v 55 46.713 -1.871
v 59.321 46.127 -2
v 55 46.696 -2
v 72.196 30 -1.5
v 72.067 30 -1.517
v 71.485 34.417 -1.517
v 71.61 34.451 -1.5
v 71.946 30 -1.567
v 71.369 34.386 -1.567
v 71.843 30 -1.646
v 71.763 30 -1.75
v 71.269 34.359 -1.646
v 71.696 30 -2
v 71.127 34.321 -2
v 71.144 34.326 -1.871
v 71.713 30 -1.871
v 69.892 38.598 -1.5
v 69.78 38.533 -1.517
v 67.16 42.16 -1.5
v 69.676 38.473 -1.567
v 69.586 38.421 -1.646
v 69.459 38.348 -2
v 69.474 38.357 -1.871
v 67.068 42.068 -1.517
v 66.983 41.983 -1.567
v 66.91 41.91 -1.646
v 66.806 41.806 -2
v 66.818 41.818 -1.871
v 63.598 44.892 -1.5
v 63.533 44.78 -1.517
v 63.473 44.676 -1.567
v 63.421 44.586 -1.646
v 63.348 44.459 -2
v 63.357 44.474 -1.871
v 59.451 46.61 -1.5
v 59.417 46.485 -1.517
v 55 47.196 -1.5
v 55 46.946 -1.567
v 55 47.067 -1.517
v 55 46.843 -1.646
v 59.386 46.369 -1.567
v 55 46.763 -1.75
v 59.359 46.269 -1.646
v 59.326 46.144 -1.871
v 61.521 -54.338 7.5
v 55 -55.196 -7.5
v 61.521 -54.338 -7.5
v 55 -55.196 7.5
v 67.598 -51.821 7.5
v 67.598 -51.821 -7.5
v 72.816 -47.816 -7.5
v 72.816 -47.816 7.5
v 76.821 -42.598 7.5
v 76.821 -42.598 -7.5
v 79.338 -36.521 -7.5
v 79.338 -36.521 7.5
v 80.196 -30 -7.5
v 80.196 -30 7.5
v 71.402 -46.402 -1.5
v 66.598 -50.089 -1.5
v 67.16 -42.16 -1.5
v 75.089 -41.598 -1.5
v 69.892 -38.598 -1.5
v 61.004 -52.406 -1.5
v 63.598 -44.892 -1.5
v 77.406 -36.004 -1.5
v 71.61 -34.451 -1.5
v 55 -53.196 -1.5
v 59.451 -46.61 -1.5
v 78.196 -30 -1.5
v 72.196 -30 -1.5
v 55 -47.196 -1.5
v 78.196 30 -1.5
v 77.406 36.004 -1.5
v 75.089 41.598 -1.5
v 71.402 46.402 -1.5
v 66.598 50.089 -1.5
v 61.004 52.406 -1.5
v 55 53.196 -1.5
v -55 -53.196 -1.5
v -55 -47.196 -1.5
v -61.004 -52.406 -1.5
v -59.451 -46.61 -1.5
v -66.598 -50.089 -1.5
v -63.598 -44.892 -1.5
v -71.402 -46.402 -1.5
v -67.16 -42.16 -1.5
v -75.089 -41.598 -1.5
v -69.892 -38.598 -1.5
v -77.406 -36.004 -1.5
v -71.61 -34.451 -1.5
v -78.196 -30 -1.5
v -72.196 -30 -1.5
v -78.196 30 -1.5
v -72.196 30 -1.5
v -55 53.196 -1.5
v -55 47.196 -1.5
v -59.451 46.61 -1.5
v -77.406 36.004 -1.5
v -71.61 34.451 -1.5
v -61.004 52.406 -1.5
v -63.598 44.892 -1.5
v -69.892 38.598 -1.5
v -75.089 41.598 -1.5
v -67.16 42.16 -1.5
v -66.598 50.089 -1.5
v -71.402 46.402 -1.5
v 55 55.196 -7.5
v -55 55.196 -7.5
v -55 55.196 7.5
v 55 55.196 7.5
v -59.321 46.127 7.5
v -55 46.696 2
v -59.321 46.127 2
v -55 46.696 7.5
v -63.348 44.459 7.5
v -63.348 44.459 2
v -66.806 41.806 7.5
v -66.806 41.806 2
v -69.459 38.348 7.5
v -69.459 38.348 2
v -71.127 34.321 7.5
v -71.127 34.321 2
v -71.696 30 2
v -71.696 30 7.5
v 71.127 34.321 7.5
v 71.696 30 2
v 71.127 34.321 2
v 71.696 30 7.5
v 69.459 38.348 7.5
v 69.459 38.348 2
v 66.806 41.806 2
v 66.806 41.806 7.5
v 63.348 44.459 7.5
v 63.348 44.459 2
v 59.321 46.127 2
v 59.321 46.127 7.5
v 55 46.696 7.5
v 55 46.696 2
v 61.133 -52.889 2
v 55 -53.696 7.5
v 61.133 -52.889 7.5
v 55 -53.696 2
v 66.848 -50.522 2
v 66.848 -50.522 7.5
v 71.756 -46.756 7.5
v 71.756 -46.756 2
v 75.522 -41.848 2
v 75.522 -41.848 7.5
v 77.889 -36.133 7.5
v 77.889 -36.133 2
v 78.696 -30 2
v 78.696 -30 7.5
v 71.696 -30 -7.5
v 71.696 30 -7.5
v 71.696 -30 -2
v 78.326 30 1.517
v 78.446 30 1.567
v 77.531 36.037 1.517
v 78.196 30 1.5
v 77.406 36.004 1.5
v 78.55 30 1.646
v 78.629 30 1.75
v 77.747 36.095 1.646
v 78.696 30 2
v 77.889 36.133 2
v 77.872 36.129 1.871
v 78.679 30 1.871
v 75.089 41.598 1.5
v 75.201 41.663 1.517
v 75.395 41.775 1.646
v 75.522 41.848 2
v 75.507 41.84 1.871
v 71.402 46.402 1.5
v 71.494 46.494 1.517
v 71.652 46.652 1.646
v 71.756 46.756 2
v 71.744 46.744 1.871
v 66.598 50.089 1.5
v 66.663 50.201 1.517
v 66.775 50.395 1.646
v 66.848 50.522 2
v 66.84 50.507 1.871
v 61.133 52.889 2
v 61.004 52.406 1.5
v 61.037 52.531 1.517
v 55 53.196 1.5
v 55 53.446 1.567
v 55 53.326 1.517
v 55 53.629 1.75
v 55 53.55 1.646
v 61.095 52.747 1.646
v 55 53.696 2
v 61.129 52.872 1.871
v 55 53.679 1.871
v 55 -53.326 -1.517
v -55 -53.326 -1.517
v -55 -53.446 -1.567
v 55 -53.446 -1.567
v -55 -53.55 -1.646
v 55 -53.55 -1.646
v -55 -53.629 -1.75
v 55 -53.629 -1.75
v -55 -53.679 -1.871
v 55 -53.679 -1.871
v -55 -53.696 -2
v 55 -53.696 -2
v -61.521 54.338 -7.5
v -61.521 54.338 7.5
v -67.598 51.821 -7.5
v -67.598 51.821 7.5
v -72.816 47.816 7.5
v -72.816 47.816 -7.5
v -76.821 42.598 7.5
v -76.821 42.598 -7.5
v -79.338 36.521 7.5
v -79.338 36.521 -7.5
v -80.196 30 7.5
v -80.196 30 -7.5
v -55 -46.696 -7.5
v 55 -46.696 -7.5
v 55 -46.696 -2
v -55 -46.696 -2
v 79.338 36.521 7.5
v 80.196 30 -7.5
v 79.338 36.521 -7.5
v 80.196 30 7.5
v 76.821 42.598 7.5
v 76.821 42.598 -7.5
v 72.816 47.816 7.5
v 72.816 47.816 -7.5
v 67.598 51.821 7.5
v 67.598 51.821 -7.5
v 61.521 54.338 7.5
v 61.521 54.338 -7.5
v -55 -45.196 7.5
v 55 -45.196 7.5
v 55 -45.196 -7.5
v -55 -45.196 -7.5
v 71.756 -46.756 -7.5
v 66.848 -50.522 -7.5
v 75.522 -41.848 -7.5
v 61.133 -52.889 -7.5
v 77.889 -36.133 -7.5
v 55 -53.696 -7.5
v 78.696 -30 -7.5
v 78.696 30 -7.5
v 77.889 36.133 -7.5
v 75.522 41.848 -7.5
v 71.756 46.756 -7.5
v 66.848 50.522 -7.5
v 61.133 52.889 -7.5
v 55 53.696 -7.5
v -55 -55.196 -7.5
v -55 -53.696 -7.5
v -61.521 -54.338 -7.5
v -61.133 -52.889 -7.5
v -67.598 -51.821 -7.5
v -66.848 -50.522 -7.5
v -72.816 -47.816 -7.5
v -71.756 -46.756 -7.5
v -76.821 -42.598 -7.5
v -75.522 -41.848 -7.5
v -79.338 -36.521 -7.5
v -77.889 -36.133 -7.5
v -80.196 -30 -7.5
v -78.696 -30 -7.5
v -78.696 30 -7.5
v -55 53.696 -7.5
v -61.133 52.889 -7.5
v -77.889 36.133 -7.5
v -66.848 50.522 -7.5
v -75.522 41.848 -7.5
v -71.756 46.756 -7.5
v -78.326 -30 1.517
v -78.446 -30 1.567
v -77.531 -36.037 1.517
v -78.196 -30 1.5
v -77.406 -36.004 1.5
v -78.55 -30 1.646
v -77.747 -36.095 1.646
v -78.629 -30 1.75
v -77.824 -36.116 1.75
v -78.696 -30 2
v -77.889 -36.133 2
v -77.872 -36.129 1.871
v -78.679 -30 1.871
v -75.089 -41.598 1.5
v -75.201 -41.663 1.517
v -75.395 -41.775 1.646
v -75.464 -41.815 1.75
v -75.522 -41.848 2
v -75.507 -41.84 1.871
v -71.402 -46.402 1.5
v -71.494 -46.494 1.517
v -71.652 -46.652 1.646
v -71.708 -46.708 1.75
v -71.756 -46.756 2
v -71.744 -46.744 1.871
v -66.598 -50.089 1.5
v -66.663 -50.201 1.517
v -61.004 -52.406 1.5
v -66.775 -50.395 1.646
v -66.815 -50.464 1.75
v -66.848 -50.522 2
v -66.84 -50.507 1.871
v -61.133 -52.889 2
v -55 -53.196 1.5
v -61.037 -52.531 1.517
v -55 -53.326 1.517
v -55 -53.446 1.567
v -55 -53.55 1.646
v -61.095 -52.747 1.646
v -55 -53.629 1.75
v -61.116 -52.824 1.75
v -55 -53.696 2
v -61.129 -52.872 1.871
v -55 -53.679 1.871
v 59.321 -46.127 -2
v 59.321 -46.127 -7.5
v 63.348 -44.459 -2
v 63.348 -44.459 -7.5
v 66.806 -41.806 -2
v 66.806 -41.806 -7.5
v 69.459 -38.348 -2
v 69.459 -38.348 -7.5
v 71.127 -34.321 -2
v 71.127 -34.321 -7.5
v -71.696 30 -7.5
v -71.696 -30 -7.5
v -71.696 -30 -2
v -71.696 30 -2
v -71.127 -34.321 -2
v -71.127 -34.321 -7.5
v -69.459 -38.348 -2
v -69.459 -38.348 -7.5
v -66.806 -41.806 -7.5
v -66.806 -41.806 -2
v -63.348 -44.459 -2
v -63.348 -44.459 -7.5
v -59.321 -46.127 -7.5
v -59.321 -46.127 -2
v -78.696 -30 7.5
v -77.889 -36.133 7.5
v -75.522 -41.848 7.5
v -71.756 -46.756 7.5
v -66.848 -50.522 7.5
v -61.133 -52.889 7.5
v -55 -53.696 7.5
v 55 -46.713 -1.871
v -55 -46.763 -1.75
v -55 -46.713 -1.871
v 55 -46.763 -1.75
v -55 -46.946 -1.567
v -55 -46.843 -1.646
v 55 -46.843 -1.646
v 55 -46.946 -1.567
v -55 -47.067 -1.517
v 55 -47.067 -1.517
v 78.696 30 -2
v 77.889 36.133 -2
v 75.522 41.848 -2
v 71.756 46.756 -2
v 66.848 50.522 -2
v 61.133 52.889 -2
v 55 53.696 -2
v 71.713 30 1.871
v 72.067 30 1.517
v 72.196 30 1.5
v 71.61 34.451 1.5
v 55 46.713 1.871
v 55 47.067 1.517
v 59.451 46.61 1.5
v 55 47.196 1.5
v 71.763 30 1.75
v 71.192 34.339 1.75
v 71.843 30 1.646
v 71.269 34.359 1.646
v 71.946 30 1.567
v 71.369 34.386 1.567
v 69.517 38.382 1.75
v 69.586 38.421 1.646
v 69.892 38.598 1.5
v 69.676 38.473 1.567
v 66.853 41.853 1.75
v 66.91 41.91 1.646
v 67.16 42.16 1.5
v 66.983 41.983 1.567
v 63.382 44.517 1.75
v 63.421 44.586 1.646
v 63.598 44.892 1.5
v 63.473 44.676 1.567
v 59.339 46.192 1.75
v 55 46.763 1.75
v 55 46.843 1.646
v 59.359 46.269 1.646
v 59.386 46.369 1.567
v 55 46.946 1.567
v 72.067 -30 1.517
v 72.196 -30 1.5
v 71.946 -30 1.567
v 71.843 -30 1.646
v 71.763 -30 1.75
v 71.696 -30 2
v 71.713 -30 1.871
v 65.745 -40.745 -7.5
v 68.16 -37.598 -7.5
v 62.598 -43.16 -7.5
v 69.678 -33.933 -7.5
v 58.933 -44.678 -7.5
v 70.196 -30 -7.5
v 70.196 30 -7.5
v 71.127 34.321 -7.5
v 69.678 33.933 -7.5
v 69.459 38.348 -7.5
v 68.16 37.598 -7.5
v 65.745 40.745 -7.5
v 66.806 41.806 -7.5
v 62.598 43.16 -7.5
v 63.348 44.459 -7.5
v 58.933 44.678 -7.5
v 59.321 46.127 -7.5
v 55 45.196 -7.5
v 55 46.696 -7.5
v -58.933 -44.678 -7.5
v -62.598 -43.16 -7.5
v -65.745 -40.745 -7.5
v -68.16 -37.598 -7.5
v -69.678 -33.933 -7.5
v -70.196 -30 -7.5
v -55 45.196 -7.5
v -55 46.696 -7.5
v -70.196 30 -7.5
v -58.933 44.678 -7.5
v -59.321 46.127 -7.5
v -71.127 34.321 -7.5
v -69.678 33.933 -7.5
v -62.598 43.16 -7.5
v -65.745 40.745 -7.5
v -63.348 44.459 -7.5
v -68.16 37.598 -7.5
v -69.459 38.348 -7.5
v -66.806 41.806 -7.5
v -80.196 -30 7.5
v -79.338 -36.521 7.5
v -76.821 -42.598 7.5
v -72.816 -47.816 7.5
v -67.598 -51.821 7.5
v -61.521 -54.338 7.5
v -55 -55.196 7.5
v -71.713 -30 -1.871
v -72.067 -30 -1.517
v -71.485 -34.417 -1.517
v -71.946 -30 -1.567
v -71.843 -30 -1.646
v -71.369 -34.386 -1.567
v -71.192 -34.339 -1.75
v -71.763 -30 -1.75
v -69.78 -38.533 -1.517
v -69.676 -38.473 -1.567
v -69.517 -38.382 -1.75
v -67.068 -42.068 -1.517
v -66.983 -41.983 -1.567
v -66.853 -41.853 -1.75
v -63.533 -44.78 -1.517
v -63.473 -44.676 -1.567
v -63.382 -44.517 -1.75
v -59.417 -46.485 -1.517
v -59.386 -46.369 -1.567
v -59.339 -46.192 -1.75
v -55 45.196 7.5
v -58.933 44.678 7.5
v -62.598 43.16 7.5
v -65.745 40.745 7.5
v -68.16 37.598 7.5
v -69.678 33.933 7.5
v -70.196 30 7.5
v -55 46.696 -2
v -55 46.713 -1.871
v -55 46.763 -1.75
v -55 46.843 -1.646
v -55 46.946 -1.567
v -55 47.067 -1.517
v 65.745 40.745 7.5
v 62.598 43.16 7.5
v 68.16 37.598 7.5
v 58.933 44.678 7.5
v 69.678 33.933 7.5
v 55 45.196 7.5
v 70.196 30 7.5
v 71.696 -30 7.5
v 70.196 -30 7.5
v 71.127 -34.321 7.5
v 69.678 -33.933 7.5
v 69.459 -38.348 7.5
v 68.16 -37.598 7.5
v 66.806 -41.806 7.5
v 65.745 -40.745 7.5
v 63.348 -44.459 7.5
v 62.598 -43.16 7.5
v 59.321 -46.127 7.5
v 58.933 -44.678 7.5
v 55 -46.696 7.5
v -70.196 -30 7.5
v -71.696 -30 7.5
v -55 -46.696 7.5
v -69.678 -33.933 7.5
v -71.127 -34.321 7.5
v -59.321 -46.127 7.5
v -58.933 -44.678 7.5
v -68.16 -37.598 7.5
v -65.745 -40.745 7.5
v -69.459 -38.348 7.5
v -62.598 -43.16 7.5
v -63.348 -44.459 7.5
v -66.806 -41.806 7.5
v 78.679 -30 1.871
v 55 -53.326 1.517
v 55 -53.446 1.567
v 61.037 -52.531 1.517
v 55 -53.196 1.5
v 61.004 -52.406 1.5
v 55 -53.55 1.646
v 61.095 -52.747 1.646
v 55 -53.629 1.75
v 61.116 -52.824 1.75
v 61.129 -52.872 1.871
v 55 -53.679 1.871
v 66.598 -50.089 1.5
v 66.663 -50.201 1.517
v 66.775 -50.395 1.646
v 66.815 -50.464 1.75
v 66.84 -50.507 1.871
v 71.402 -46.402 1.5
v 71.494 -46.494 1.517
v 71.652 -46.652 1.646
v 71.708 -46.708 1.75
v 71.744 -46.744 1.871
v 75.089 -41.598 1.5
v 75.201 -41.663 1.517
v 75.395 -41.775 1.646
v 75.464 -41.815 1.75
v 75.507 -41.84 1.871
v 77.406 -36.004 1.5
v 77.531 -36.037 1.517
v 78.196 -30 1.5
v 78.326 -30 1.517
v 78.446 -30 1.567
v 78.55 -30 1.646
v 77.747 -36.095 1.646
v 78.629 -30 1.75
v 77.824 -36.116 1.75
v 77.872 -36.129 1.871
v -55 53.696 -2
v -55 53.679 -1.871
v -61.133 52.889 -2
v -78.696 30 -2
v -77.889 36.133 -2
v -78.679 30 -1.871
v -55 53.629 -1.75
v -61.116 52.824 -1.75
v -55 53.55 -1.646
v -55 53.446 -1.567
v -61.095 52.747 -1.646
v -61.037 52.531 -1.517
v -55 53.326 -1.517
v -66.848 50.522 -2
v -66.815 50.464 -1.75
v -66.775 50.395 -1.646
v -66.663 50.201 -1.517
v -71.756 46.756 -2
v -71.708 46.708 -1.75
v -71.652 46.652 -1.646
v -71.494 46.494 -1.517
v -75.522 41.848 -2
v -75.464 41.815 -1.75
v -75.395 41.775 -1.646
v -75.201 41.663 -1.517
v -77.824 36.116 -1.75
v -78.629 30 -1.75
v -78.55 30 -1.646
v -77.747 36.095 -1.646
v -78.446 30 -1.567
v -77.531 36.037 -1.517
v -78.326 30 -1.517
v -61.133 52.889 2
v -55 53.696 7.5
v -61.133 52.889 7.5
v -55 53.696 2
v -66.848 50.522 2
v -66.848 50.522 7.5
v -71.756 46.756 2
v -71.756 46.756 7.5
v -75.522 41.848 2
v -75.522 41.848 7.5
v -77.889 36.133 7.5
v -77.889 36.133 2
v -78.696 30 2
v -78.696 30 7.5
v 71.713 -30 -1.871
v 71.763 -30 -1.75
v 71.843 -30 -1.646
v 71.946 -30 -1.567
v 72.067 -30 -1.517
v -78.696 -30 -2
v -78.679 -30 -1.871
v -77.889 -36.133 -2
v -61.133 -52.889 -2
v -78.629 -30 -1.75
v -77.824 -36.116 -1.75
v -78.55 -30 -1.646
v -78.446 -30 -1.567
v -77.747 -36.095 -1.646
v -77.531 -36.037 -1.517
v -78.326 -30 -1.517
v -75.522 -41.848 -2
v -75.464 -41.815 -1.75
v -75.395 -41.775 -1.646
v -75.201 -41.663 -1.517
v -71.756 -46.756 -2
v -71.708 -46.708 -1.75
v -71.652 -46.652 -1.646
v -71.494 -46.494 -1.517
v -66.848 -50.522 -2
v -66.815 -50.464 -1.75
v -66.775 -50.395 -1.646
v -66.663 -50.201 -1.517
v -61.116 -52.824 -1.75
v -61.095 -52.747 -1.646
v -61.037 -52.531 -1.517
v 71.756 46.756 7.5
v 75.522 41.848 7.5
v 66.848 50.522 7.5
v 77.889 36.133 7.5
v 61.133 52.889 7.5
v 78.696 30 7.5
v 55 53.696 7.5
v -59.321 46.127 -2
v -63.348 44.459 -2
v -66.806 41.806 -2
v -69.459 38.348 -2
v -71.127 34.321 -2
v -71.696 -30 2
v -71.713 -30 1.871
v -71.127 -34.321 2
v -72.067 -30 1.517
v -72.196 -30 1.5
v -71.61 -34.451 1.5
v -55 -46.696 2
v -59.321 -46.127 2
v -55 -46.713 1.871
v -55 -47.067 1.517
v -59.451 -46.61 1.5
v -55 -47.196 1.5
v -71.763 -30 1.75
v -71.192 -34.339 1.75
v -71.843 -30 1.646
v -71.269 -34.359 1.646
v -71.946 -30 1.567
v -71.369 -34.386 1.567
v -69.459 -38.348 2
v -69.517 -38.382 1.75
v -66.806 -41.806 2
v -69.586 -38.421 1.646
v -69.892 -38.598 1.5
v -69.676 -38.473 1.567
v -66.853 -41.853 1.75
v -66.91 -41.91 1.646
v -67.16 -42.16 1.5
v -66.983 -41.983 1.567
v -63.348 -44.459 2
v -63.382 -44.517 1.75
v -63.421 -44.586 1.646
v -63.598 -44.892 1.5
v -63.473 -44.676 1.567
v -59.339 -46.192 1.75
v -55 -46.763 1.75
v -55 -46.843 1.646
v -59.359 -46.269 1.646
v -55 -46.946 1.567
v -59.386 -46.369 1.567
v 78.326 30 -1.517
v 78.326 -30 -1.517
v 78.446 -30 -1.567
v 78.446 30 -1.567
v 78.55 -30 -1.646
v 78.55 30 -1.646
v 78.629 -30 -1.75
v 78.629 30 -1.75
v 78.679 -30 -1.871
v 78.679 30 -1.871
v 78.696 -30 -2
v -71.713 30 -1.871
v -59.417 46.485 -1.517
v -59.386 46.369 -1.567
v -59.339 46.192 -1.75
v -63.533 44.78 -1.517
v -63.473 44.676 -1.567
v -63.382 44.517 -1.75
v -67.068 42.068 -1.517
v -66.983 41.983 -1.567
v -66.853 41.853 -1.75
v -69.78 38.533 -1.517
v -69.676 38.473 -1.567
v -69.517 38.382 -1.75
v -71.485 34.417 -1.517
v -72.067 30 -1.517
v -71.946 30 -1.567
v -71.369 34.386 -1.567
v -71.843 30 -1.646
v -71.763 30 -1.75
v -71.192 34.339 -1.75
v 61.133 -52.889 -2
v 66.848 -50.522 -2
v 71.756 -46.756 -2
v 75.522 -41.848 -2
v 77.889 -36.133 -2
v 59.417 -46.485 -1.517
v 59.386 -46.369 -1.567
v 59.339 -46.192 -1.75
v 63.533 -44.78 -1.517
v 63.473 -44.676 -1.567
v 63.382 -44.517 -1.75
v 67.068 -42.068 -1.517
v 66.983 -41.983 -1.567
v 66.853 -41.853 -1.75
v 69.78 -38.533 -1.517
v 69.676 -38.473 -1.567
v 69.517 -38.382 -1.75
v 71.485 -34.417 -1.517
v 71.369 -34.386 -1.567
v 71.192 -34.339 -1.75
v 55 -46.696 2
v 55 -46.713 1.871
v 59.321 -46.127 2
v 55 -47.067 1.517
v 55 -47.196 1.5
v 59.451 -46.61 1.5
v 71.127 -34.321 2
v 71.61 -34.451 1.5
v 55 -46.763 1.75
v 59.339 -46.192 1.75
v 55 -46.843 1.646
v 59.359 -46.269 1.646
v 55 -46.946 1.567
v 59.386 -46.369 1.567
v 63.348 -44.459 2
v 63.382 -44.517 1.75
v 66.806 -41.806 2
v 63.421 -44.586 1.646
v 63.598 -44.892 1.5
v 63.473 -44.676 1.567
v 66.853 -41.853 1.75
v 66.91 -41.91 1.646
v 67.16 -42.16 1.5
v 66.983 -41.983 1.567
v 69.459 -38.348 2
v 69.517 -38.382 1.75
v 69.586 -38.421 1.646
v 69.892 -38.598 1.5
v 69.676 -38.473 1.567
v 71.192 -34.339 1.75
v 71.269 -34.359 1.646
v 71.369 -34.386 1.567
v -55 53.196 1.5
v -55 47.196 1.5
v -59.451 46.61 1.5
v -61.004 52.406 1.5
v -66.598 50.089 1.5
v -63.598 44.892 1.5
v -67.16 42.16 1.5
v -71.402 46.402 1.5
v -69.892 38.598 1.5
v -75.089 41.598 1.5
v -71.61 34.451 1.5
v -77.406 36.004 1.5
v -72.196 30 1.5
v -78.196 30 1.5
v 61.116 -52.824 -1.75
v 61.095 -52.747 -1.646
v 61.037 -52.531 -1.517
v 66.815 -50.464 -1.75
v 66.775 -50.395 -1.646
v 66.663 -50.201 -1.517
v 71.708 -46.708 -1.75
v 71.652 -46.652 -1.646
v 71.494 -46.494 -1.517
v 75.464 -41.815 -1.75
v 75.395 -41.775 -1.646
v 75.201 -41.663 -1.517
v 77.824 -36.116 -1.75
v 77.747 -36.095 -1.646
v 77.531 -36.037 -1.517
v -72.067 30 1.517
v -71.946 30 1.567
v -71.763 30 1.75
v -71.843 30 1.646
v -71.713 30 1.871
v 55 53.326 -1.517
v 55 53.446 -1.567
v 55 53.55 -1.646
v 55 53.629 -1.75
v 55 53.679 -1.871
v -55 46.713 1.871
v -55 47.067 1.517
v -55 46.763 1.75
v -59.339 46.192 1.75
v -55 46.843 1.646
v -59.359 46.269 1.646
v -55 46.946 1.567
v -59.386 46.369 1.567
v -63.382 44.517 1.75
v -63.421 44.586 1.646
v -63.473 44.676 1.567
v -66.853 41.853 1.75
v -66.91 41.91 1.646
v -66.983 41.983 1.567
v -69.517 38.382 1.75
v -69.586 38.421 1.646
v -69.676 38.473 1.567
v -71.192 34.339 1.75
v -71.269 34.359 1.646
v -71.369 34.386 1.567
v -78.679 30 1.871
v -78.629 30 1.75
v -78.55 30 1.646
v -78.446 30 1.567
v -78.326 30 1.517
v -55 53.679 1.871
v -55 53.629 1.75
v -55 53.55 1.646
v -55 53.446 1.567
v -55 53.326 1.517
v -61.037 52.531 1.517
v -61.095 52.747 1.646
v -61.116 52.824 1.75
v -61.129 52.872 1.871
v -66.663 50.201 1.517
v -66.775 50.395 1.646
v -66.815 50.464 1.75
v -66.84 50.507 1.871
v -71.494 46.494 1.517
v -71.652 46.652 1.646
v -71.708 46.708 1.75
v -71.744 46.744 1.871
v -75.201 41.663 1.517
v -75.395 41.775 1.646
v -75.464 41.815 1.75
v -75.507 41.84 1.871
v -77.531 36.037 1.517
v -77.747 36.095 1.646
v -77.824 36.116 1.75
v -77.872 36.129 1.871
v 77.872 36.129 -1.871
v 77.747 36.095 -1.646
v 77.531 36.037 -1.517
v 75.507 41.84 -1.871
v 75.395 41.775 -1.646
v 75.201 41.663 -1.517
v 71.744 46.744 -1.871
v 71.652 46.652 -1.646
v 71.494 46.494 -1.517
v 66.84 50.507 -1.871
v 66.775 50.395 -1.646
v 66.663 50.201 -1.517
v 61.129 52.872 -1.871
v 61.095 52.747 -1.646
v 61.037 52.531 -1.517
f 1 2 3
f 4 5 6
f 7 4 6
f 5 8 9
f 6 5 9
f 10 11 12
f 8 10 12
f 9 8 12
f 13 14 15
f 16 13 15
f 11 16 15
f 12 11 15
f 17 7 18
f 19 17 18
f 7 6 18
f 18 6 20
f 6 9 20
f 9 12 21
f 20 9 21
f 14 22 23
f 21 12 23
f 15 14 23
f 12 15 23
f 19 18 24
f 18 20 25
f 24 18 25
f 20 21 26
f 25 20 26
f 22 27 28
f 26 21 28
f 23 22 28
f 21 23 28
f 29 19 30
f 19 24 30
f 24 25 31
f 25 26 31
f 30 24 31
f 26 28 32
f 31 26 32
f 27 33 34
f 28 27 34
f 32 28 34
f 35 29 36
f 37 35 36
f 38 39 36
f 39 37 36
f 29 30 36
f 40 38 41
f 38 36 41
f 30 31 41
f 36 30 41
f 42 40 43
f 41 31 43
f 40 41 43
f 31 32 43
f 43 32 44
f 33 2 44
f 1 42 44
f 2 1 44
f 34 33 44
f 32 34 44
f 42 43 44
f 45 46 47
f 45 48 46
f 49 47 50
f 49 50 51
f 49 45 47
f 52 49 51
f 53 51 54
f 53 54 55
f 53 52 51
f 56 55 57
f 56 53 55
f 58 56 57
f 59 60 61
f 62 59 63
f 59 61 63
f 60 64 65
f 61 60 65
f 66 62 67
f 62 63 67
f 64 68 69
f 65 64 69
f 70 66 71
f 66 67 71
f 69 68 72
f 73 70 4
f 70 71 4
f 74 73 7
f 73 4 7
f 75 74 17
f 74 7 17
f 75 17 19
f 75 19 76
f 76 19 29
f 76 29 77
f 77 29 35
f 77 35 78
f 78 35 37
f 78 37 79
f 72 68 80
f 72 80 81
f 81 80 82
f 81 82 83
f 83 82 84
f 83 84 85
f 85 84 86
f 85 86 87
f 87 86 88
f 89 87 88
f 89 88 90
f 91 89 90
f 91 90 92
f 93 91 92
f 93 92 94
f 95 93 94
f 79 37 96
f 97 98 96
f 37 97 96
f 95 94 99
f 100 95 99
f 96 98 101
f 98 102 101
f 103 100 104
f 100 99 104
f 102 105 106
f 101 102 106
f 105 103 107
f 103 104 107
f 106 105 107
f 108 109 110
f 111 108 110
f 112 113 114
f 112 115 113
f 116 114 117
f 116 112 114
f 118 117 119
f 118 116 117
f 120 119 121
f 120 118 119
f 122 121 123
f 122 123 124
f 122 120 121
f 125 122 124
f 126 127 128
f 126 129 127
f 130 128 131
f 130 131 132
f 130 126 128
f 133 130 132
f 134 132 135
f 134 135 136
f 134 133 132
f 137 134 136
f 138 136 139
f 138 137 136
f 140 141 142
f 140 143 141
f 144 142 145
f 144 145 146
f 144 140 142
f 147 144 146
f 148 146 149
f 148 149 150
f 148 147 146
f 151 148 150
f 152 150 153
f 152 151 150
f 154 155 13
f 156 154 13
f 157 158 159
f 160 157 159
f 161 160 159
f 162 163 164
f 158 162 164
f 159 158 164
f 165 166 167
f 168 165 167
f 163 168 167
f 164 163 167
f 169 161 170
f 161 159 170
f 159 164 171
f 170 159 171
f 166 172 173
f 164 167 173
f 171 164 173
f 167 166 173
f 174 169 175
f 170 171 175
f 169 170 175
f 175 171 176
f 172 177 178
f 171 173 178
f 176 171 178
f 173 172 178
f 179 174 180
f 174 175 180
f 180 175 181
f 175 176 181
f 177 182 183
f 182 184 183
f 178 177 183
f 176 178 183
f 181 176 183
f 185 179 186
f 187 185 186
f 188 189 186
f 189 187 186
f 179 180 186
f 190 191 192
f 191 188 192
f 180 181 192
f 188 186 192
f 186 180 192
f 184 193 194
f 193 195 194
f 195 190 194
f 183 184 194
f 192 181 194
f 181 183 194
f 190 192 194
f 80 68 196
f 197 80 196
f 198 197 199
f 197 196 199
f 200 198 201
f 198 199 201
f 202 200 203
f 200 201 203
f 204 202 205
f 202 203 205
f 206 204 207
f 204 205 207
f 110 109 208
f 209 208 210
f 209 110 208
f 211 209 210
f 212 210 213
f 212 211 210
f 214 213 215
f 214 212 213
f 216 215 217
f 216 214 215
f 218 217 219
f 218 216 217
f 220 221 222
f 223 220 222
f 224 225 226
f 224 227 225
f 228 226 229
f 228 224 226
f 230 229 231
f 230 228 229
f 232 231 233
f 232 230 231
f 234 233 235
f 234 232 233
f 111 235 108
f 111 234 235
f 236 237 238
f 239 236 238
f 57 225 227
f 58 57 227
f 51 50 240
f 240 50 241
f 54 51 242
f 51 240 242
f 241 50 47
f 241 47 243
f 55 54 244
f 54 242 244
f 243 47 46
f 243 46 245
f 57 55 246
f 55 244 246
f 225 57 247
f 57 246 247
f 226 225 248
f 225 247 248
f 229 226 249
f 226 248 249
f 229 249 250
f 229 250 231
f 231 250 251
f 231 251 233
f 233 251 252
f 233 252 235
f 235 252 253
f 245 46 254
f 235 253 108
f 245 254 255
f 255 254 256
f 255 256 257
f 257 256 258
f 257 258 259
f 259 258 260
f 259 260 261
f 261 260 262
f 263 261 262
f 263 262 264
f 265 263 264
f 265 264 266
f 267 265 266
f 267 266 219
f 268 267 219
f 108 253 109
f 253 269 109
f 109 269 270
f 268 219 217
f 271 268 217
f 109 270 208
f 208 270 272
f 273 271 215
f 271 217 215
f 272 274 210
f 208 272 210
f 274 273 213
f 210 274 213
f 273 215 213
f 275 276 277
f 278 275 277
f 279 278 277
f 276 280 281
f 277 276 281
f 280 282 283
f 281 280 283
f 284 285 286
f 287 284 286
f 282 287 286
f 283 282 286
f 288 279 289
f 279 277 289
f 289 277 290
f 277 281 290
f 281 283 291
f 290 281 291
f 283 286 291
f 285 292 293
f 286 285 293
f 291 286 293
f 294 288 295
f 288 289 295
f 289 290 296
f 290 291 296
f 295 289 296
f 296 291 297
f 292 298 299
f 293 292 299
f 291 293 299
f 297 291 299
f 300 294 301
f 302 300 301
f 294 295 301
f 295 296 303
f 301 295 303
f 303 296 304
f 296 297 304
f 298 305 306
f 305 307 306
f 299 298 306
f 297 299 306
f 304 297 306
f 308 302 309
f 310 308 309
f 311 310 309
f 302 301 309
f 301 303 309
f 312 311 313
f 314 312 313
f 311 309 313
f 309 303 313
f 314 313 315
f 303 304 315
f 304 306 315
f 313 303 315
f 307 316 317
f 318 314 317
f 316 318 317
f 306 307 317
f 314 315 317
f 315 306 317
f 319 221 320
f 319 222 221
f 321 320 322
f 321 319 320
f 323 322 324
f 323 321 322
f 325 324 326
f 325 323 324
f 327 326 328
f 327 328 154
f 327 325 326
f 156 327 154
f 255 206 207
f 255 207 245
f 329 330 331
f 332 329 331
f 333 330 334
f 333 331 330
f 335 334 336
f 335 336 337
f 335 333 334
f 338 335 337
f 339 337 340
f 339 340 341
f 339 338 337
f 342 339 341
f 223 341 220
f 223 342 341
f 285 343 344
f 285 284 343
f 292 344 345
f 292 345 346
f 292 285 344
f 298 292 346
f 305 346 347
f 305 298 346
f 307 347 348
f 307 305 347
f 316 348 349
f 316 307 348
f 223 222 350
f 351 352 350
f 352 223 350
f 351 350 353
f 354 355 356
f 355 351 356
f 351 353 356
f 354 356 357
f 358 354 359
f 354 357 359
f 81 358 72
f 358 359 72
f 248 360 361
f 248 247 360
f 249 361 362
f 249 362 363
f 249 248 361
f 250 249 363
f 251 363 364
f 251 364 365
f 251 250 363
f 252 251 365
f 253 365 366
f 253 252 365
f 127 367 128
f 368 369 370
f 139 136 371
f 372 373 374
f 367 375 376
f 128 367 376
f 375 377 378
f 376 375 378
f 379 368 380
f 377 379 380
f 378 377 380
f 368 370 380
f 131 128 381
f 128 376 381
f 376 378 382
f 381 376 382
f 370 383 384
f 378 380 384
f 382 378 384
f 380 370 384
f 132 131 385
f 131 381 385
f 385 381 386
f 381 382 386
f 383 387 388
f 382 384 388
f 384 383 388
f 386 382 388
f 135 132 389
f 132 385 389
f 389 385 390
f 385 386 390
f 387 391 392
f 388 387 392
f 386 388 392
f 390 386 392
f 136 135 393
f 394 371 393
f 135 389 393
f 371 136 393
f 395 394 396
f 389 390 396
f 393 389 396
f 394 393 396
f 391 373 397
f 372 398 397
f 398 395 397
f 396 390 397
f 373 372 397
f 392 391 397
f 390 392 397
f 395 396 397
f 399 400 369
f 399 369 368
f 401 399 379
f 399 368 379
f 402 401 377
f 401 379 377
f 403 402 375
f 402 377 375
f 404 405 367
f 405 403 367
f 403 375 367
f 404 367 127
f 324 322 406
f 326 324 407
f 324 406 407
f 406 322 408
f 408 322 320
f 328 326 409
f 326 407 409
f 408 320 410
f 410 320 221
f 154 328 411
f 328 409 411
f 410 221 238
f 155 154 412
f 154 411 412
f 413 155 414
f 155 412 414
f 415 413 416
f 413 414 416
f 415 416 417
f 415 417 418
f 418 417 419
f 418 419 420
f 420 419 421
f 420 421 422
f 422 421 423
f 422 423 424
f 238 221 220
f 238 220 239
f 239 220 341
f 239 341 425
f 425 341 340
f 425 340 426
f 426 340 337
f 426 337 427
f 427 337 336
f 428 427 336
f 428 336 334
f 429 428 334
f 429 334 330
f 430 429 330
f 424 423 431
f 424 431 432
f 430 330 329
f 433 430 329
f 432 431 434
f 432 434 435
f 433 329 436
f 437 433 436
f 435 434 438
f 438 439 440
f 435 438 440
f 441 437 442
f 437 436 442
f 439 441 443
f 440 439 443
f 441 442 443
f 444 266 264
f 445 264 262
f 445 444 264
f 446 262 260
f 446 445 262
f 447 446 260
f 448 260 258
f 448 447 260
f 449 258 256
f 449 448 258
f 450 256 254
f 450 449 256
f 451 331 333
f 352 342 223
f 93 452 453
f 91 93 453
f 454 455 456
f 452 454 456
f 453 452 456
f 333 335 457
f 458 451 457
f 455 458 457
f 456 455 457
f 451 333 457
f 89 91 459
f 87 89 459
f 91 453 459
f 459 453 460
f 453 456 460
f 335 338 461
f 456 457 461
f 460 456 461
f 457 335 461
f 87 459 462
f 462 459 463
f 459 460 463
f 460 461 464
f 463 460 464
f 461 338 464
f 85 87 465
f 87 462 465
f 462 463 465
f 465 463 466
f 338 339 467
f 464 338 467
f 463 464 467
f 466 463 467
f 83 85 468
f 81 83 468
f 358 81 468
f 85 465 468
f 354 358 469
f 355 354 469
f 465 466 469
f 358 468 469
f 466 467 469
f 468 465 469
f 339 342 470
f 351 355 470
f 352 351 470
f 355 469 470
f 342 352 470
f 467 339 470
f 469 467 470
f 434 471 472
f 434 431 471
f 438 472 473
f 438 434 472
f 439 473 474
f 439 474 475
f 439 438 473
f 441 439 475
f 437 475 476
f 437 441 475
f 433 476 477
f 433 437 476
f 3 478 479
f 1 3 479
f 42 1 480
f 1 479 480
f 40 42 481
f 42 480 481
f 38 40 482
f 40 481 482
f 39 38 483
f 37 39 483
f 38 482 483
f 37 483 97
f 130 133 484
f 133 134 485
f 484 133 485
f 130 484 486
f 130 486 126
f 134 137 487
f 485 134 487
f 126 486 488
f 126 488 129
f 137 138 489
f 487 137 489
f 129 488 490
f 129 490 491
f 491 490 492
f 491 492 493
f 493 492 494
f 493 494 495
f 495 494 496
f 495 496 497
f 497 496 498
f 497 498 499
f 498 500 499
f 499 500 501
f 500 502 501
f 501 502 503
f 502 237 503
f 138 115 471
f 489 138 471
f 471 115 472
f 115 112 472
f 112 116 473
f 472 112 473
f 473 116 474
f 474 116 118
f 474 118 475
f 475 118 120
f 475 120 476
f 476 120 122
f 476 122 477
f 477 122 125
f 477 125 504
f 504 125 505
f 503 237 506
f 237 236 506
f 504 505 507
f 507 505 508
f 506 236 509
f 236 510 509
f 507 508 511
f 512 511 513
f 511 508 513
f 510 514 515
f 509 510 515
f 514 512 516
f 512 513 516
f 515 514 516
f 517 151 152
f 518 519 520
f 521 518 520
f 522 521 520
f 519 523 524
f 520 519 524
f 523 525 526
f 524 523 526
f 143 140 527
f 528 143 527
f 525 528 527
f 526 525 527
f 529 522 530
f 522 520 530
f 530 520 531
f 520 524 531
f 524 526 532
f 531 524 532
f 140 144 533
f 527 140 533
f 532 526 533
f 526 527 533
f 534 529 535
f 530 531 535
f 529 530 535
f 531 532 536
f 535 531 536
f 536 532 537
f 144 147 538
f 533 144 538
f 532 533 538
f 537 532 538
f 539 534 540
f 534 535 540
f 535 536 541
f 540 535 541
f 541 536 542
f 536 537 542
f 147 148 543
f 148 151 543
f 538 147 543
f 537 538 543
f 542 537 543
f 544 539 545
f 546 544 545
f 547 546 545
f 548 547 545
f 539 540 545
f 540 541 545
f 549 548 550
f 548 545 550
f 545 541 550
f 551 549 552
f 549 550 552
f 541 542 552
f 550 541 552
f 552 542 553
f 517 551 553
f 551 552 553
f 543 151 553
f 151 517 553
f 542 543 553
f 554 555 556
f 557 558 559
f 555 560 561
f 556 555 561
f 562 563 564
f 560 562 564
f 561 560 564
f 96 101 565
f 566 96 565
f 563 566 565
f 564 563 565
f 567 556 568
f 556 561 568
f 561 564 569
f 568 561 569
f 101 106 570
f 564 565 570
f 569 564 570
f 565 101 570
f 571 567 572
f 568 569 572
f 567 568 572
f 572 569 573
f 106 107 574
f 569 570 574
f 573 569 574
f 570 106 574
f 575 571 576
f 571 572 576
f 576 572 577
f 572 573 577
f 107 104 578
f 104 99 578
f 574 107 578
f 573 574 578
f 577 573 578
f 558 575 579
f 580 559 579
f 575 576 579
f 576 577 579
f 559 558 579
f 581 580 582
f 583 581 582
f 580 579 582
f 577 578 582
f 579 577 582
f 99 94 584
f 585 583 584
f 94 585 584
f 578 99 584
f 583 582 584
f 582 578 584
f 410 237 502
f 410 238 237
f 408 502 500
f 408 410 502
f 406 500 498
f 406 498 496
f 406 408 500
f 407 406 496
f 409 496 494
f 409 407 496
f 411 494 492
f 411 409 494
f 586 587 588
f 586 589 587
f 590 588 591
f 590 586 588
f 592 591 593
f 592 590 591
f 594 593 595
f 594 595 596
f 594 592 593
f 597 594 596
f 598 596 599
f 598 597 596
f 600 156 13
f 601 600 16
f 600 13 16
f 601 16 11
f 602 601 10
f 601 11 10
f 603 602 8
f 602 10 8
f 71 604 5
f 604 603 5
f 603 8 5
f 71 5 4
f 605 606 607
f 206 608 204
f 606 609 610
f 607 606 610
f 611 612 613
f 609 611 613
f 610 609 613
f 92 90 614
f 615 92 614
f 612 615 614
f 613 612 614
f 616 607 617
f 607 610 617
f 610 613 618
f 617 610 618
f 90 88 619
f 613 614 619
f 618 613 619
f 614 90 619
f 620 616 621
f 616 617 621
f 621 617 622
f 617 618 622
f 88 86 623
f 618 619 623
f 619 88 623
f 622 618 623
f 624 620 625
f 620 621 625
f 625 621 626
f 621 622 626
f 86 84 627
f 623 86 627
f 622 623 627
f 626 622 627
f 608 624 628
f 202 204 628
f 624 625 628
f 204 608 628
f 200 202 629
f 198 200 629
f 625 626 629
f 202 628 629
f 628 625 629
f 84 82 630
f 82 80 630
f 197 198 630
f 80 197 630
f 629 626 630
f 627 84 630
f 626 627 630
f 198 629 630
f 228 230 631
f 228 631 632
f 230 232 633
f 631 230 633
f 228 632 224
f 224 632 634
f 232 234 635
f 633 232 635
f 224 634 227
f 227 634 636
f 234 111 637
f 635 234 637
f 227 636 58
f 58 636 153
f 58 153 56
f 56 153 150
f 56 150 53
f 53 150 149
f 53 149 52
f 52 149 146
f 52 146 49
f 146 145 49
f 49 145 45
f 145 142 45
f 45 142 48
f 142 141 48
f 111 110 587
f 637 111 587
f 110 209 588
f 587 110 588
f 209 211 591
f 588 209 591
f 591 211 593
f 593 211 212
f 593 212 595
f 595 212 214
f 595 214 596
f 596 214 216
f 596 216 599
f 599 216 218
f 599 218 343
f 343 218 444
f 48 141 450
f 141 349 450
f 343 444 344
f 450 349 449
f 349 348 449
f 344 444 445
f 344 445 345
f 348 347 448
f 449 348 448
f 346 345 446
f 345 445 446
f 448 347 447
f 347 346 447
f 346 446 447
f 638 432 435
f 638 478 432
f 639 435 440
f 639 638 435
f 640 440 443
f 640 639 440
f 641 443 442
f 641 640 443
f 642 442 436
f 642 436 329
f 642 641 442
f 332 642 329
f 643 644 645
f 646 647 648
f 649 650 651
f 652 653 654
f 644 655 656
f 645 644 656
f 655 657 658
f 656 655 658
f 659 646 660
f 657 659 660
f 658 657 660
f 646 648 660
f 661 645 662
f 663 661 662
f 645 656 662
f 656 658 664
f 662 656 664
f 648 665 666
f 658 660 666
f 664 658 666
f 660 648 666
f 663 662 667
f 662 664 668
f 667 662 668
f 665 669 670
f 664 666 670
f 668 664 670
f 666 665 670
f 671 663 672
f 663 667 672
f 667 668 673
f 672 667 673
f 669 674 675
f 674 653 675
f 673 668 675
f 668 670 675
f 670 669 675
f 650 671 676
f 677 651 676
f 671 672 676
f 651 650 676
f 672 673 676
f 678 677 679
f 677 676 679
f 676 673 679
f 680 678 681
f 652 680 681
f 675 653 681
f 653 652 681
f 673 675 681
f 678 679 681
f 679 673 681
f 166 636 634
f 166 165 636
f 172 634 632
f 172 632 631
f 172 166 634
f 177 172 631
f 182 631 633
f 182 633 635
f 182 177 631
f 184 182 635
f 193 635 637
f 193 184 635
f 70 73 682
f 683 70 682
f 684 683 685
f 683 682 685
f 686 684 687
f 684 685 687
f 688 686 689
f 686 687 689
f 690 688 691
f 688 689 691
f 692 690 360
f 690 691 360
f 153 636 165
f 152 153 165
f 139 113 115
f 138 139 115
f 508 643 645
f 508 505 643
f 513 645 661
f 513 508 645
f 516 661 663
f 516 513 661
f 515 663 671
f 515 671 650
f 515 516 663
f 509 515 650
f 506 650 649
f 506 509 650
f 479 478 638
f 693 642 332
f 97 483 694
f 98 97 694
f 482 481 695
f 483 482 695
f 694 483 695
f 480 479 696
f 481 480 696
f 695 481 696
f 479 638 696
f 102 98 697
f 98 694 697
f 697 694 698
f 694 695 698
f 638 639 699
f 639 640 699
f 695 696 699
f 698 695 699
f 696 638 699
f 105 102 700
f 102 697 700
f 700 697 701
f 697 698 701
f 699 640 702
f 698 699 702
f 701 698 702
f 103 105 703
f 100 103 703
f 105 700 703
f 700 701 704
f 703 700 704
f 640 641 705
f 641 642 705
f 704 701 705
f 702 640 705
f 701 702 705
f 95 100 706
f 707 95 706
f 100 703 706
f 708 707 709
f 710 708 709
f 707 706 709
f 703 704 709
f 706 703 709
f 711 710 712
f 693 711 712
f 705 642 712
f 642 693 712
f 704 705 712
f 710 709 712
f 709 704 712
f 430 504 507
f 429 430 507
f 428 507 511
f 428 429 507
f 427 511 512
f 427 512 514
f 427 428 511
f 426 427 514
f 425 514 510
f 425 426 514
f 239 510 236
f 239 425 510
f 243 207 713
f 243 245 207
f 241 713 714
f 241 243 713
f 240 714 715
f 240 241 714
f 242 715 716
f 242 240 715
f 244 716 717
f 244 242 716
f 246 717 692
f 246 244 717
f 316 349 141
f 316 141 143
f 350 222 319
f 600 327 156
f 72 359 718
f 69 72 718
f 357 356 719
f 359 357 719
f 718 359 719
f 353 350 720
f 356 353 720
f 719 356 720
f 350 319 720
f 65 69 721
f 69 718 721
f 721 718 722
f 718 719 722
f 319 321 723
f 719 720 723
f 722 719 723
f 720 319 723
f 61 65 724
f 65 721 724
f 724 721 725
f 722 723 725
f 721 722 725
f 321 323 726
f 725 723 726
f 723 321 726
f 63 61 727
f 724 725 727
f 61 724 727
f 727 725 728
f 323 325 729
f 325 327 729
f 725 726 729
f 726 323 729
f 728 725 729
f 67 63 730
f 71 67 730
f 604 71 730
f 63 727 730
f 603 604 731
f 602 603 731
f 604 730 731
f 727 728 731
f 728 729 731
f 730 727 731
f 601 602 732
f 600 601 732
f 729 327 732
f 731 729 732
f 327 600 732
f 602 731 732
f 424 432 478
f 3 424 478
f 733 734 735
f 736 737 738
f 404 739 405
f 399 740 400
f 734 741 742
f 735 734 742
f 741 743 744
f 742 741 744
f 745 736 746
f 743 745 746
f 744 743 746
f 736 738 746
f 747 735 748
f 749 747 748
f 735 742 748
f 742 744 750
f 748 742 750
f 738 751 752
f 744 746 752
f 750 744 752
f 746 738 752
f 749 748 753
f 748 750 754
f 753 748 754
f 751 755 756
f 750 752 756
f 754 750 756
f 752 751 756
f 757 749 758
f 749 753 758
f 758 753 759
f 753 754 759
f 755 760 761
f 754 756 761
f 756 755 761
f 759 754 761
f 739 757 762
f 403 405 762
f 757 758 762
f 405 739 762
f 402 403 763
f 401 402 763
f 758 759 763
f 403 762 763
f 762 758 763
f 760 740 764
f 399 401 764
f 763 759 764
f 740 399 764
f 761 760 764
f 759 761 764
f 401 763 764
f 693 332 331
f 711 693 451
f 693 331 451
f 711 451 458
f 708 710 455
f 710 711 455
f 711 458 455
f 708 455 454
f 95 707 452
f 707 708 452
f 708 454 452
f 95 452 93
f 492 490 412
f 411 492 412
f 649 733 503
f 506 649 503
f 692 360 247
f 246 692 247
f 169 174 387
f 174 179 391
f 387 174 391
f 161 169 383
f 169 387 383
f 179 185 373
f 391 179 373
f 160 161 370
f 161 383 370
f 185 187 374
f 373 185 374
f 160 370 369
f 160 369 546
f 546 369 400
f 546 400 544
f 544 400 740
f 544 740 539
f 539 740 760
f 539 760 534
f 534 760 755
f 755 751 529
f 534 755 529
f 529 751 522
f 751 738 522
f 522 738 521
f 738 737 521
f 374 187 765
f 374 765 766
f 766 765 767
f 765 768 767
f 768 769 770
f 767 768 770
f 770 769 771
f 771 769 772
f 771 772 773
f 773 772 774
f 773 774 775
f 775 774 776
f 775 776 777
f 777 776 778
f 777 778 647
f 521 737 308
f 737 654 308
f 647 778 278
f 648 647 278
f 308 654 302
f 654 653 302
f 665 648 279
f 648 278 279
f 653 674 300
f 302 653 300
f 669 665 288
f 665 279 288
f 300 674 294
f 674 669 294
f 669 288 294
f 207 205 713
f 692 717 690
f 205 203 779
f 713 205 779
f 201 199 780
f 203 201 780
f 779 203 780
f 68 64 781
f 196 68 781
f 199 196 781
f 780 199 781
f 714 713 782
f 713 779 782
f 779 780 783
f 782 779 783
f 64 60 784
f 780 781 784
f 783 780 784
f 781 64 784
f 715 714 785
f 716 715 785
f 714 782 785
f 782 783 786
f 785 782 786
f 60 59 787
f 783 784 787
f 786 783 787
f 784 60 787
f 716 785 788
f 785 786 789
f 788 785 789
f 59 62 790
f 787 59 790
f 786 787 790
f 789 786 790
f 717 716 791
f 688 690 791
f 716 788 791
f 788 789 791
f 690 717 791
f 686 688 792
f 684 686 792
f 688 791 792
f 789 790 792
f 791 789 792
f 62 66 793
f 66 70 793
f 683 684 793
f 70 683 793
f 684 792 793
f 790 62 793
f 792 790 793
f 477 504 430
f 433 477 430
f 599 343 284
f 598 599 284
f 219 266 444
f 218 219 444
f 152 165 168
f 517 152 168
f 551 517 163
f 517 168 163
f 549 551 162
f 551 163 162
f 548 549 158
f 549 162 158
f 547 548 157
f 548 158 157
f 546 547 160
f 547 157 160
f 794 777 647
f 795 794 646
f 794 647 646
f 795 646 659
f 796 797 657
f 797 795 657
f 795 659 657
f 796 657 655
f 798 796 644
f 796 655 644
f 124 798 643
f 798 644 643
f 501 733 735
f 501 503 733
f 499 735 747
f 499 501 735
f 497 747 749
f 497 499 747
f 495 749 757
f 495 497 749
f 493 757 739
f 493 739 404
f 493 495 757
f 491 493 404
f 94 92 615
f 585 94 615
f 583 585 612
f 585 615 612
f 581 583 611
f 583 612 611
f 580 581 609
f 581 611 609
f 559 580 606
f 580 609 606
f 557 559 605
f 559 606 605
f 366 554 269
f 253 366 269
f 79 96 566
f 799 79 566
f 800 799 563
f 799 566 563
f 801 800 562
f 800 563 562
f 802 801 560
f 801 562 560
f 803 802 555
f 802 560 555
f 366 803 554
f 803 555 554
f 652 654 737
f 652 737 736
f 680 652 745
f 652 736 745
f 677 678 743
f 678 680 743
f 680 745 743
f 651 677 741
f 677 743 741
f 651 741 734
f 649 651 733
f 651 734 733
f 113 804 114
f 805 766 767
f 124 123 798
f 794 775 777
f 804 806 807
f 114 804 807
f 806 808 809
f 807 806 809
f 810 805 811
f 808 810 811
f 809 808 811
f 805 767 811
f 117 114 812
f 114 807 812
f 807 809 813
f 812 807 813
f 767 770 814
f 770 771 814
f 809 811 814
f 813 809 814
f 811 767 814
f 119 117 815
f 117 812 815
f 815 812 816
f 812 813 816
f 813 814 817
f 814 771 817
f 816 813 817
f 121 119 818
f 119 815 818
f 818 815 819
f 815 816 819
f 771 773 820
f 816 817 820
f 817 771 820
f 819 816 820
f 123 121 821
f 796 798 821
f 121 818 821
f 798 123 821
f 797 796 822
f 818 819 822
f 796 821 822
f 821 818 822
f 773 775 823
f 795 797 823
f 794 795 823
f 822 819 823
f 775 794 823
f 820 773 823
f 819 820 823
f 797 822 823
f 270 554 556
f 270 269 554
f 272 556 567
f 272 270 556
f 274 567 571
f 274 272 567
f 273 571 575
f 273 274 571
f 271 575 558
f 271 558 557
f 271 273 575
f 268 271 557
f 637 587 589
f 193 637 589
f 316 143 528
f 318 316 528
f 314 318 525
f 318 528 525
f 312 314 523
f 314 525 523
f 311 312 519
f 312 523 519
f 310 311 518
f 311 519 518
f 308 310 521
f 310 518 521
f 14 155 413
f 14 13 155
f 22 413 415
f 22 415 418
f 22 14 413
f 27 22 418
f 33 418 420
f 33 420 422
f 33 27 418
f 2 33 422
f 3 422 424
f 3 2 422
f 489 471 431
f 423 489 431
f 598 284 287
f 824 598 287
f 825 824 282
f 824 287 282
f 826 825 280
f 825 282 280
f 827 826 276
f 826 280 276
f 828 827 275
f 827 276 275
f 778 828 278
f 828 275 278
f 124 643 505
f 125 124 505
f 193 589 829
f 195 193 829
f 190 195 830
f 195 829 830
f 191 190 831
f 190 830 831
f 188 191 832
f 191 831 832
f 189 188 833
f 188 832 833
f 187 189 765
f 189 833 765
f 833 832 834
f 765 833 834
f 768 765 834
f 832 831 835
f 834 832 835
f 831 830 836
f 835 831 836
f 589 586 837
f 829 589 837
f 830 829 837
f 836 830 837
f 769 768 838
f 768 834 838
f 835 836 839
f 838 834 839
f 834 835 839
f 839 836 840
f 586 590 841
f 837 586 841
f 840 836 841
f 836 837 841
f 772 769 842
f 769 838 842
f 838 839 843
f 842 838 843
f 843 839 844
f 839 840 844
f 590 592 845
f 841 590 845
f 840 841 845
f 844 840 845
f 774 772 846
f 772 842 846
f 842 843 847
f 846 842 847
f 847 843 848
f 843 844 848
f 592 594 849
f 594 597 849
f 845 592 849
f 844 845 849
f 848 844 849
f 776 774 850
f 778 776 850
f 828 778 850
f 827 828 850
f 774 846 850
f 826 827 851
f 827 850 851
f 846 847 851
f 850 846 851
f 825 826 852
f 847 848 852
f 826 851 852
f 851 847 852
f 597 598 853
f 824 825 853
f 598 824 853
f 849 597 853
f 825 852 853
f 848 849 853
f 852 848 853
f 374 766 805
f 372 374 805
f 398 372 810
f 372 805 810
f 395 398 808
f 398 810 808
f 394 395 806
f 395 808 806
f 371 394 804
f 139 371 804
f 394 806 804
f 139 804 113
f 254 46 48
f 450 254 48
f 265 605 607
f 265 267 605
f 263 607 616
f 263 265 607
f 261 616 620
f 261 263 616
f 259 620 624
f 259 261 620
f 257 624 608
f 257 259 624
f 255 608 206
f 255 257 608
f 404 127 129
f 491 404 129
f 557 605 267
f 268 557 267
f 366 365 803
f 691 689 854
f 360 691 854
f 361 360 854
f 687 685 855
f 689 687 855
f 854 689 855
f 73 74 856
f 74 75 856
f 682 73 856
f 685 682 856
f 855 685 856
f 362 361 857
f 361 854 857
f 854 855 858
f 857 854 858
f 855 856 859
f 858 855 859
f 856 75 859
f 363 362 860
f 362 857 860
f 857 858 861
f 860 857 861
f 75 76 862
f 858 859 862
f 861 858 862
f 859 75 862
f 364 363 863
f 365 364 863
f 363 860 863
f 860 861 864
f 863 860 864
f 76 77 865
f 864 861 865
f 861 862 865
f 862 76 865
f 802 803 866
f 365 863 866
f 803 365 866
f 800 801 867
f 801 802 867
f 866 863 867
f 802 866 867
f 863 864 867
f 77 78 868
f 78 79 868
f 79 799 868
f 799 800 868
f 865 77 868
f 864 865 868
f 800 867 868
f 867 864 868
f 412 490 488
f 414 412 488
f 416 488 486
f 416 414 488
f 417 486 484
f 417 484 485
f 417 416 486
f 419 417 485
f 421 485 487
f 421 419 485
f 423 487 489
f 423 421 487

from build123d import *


with BuildPart() as f2:
    # F2: sweep along a path in F0
    with BuildLine(Plane.XY) as f2_path:
        Line((55, 50), (-55, 50))
        ThreePointArc((-55, 50), (-69.142136, 44.142136), (-75, 30))
        Line((-75, 30), (-75, -30))
        ThreePointArc((-75, -30), (-69.142136, -44.142136), (-55, -50))
        Line((-55, -50), (55, -50))
        ThreePointArc((55, -50), (69.142136, -44.142136), (75, -30))
        Line((75, -30), (75, 30))
        ThreePointArc((75, 30), (69.142136, 44.142136), (55, 50))
    # F1 (on Right) → F2 (sweep)
    with BuildSketch(Plane.YZ):
        with BuildLine():
            Line((55.19626, 0), (55.19626, 7.5))
            Line((55.19626, 7.5), (53.69626, 7.5))
            Line((53.69626, 7.5), (53.69626, 2))
            ThreePointArc((53.69626, 2), (53.549814, 1.646447), (53.19626, 1.5))
            Line((53.19626, 1.5), (47.19626, 1.5))
            ThreePointArc((47.19626, 1.5), (46.842707, 1.646447), (46.69626, 2))
            Line((46.69626, 2), (46.69626, 7.5))
            Line((46.69626, 7.5), (45.19626, 7.5))
            Line((45.19626, 7.5), (45.19626, -7.5))
            Line((45.19626, -7.5), (46.69626, -7.5))
            Line((46.69626, -7.5), (46.69626, -2))
            ThreePointArc((46.69626, -2), (46.842707, -1.646447), (47.19626, -1.5))
            Line((47.19626, -1.5), (53.19626, -1.5))
            ThreePointArc((53.19626, -1.5), (53.549814, -1.646447), (53.69626, -2))
            Line((53.69626, -2), (53.69626, -7.5))
            Line((53.69626, -7.5), (55.19626, -7.5))
            Line((55.19626, -7.5), (55.19626, 0))
        make_face()
    sweep(path=f2_path.line)


solid = f2.part
